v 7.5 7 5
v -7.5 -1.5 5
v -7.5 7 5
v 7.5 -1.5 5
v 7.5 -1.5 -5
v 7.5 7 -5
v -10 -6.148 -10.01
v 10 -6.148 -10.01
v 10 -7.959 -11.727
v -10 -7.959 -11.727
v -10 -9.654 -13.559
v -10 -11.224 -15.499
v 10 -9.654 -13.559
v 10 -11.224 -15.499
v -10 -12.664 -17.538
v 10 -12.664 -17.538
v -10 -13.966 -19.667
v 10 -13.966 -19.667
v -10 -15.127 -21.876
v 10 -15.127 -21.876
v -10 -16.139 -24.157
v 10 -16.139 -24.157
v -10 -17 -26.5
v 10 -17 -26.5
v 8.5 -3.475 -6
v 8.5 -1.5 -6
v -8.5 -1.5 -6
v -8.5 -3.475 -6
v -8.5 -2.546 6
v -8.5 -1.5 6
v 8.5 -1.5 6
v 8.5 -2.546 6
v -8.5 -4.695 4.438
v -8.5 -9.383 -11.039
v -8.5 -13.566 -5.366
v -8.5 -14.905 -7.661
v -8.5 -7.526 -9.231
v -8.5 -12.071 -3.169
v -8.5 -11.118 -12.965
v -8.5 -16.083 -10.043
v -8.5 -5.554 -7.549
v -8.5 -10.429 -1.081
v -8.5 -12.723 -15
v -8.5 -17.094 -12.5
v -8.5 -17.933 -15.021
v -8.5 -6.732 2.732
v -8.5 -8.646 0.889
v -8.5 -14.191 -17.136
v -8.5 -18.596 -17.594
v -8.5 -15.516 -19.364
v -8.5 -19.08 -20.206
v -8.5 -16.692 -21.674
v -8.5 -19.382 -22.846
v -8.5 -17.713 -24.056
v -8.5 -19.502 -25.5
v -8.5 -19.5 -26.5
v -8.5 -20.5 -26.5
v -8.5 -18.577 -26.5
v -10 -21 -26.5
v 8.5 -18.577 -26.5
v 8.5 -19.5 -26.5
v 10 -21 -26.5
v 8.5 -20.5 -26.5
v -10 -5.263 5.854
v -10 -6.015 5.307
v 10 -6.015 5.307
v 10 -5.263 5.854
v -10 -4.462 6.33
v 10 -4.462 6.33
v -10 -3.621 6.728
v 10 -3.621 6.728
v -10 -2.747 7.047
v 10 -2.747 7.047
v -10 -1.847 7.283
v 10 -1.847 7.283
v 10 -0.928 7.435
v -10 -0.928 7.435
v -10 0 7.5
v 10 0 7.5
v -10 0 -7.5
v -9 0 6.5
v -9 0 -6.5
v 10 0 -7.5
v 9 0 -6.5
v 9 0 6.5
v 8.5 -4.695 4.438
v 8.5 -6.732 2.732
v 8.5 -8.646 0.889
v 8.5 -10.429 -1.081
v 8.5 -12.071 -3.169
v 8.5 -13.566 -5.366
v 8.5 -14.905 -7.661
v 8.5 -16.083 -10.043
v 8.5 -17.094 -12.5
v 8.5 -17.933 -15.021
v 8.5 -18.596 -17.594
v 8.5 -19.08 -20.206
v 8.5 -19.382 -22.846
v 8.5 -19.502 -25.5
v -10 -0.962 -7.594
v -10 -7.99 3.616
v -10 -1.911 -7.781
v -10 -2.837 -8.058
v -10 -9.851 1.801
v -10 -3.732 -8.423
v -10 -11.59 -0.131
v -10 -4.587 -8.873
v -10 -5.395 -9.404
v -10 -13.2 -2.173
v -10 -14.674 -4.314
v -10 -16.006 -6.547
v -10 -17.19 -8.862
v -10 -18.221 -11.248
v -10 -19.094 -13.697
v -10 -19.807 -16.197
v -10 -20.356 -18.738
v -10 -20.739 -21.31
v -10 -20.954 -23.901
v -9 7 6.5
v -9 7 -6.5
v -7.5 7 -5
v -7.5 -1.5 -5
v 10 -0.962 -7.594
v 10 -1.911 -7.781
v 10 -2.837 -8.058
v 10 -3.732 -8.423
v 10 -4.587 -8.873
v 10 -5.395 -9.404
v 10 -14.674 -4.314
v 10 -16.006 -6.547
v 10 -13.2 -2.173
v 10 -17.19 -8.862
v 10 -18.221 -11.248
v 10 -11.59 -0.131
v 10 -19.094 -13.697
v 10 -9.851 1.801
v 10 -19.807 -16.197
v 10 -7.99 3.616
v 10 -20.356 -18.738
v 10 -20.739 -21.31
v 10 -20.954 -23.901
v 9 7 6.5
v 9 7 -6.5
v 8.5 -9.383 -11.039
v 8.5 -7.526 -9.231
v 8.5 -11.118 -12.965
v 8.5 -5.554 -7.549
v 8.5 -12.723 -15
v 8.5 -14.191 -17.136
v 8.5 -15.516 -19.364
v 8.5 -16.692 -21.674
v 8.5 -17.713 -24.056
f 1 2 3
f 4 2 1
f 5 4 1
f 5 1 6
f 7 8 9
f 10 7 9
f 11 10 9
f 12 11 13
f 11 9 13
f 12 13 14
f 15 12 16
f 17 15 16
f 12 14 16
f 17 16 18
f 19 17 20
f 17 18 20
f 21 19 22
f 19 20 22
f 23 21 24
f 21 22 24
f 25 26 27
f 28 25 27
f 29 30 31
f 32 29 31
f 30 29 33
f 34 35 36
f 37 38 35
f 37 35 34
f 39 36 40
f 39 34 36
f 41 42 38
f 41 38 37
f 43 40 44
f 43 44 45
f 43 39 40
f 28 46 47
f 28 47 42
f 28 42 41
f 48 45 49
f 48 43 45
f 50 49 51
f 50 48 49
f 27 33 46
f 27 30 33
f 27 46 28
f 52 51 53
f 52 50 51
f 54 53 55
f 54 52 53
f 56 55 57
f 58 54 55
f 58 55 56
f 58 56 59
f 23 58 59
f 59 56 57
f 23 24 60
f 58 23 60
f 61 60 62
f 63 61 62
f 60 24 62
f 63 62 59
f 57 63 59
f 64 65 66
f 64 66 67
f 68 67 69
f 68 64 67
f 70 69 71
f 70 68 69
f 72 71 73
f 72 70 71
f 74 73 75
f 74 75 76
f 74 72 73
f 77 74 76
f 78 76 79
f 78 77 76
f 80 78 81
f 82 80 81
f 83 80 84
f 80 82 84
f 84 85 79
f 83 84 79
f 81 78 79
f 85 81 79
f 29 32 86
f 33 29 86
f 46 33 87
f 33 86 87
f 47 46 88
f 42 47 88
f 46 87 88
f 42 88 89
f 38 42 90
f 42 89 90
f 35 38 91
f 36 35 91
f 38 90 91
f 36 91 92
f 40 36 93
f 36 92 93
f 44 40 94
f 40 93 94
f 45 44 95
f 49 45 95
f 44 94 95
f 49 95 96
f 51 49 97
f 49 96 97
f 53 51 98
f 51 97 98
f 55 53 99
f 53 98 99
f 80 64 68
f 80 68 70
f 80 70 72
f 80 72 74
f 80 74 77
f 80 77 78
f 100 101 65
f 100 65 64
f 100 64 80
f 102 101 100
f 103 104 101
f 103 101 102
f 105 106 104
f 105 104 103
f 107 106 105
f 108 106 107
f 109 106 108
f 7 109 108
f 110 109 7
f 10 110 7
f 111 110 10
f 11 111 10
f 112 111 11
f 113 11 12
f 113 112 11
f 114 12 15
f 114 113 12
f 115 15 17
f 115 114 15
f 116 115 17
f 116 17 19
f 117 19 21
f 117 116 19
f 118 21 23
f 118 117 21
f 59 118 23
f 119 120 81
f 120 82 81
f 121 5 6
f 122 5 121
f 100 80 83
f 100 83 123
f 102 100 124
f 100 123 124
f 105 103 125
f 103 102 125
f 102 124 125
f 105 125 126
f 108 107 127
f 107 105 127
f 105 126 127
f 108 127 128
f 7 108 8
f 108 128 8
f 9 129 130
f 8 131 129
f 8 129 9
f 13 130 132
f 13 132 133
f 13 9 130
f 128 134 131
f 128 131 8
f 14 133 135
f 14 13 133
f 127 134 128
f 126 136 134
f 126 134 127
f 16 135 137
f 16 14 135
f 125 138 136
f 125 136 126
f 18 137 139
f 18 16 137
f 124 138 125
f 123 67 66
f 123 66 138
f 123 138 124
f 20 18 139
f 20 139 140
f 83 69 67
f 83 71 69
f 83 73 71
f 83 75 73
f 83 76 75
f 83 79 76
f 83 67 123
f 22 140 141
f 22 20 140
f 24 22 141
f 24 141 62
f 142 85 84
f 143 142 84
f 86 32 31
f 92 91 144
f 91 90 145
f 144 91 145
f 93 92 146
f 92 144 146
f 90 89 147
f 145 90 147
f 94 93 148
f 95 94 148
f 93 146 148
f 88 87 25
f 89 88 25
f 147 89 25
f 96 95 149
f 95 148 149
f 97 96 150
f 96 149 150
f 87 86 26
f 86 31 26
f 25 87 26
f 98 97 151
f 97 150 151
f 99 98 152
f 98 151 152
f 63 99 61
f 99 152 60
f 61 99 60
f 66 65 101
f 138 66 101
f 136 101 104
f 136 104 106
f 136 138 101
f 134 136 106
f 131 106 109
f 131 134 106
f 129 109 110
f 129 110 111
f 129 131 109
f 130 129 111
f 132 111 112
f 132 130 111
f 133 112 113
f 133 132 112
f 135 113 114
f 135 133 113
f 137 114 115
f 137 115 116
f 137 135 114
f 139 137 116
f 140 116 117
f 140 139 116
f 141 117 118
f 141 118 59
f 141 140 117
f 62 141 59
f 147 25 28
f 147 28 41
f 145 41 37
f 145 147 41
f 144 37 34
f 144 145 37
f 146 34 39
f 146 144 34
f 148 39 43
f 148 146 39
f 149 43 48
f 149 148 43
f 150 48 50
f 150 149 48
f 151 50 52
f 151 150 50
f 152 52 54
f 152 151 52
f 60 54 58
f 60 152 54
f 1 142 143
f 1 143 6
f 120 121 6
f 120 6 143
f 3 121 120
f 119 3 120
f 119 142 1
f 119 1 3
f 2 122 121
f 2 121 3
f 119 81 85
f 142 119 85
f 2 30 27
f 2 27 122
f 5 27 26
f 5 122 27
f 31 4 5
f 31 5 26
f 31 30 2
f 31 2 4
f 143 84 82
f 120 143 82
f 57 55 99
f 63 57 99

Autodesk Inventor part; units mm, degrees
ref_plane "YZ Plane" through (0, 0, 0) normal (1, 0, 0) x (0, 1, 0)
ref_plane "XZ Plane" through (0, 0, 0) normal (0, 1, 0) x (-1, 0, 0)
ref_plane "XY Plane" through (0, 0, 0) normal (0, 0, 1) x (1, 0, 0)
sketch "Szkic1" plane through (0, 0, 0) normal (0, 1, 0) x (-1, 0, 0)
  line L0 (9, 6.5) -> (-9, 6.5)
  line L1 (-9, 6.5) -> (-9, -6.5)
  line L2 (-9, -6.5) -> (9, -6.5)
  line L3 (9, -6.5) -> (9, 6.5)
  line L4 (9, 0) -> (0, 0) construction
  line L5 (0, 0) -> (0, -6.5) construction
  dimension "d0" = 13
  dimension "d1" = 18
extrude "Wyciągnięcie proste1" add sketch "Szkic1" along normal blind 7
sketch "Szkic2" plane through (0, 0, 0) normal (0, -1, 0) x (1, 0, 0)
  line L0 (-10, 7.5) -> (10, 7.5)
  line L1 (10, 7.5) -> (10, -7.5)
  line L2 (10, -7.5) -> (-10, -7.5)
  line L3 (-10, -7.5) -> (-10, 7.5)
  line L4 (0, 7.5) -> (0, 0) construction
  line L5 (0, 0) -> (10, 0) construction
  dimension "d4" = 20
  dimension "d5" = 15
extrude "Wyciągnięcie proste2" add sketch "Szkic2" along normal blind 3
sketch "Szkic3" plane through (10, 0, 7.5) normal (1, 0, 0) x (0, 0, -1)
  line L0 (0, 0) -> (0, -3) projected
  arc A0 (0, -3) -> (34, -21) centre (33.4095, 18.9956) ccw
  line L1 (1, 7) -> (14, 7) projected
  line L2 (0, -3) -> (15, -3) projected
  arc A1 (15, -3) -> (34, -17) centre (45.9271, 19.0797) ccw
  line L3 (34, -17) -> (34, -21)
  line L4 (15, 0) -> (15, -3) projected
  line L5 (0, -3) -> (15, -3)
  point P0 (7.5, 0)
  dimension "d10" = 34
  dimension "d11" = 40
  dimension "d12" = 28
  dimension "d13" = 4
  dimension "d14" = 38
extrude "Wyciągnięcie proste3" add sketch "Szkic3" against normal up to surface (20 mm away)
shell "Skorupa1" thickness 1.5 removed faces 2 at (-3, 7, 2.1667) at (-3.3333, -19.6667, -26.5)
fillet "Zaokrąglenie1" radius 10 2 edges at (0, -3, -7.5) (0, -3, 7.5)
chamfer "Faza1" distance 1 angle 45 1 edges at (0, -19.4998, -26.5)
properties part number "45_dysza chłodząca"
